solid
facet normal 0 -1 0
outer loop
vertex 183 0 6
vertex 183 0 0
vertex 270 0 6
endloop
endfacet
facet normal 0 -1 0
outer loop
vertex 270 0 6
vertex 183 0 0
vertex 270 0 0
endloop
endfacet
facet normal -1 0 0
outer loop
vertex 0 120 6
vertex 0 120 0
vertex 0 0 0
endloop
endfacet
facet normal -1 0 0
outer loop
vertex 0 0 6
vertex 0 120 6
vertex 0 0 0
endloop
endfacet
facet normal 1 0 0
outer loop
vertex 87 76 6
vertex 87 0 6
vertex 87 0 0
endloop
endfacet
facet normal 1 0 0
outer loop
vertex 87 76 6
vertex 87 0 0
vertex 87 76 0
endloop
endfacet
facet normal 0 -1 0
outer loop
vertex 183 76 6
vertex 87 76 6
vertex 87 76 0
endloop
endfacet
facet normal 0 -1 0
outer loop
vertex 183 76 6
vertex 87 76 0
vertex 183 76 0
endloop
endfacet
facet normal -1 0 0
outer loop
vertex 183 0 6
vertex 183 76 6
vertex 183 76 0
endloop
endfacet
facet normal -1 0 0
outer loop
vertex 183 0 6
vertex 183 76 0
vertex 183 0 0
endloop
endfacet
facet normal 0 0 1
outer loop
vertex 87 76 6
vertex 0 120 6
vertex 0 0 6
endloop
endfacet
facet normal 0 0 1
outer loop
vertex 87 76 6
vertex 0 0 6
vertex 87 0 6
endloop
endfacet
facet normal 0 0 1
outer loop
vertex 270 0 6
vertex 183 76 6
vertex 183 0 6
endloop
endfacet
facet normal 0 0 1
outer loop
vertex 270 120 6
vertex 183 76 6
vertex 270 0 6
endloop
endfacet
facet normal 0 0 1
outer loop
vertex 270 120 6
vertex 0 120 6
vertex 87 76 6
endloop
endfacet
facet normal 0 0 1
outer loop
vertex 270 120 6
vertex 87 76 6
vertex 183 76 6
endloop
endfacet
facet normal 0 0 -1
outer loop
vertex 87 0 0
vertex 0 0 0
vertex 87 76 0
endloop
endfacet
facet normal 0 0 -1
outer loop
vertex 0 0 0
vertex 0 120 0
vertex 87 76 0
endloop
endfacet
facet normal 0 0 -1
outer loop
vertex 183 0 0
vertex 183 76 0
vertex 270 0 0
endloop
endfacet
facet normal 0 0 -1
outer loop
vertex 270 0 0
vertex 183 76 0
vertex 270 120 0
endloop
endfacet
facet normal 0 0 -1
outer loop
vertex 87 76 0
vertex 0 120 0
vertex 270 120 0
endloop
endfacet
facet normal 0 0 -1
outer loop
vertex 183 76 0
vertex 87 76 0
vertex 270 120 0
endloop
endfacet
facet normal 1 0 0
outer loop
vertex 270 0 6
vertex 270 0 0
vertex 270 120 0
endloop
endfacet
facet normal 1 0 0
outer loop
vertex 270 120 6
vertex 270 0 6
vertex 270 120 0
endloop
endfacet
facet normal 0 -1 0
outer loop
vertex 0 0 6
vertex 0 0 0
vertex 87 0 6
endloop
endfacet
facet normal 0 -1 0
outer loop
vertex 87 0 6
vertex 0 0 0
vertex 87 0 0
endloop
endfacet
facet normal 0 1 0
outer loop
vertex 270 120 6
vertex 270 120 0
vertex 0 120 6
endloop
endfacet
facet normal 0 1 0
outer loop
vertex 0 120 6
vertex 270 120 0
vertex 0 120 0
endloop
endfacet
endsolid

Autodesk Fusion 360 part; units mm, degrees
sketch "Sorting Mechanism Top Panel" plane through (0, 0, 0) normal (0, 0, 1) x (1, 0, 0)
  line L0 (0, 0) -> (270, 0)
  line L1 (270, 0) -> (270, 120)
  line L2 (270, 120) -> (0, 120)
  line L3 (0, 120) -> (0, 0)
  dimension "d1" = 270
  dimension "d2" = 120
extrude "Extrude1" add sketch "Sorting Mechanism Top Panel" along normal blind 6
sketch "Smartie Hopper Hole" plane through (0, 0, 6) normal (0, 0, 1) x (-1, 0, 0)
  line L0 (0, -120) -> (0, 0)
  line L1 (0, 0) -> (-270, 0)
  line L2 (-270, 0) -> (-270, -120)
  line L3 (-270, -120) -> (0, -120)
  line L4 (-87, -76) -> (-183, -76)
  line L5 (-183, -76) -> (-183, 0)
  line L6 (-183, 0) -> (-87, 0)
  line L7 (-87, 0) -> (-87, -76)
  dimension "d7" = 96
  dimension "d9" = 76
  dimension "d10" = 87
  dimension "d11" = 87
extrude "Extrude2" cut sketch "Smartie Hopper Hole" against normal blind 6 contours L1 L4 L5 L6 L7
equation "d3 = MDF_thickness"
equation "acrylic_thickness = 3 mm" comment "Thickness of the clear acrylic panels"
equation "MDF_thickness = 6 mm" comment "Thickness of the MDF panels"
equation "d7 = smarties_hopper_width + 2 * acrylic_thickness"
equation "smarties_hopper_width = 90 mm" comment "Width of the Smarties hopper"
equation "d9 = smarties_hopper_depth + 2 * acrylic_thickness"
equation "d10 = ( 270 mm - ( smarties_hopper_width + 2 * acrylic_thickness ) ) / 2"
equation "d14 = -MDF_thickness"
equation "smarties_hopper_depth = 70 mm" comment "Depth of the Smarties hopper"
